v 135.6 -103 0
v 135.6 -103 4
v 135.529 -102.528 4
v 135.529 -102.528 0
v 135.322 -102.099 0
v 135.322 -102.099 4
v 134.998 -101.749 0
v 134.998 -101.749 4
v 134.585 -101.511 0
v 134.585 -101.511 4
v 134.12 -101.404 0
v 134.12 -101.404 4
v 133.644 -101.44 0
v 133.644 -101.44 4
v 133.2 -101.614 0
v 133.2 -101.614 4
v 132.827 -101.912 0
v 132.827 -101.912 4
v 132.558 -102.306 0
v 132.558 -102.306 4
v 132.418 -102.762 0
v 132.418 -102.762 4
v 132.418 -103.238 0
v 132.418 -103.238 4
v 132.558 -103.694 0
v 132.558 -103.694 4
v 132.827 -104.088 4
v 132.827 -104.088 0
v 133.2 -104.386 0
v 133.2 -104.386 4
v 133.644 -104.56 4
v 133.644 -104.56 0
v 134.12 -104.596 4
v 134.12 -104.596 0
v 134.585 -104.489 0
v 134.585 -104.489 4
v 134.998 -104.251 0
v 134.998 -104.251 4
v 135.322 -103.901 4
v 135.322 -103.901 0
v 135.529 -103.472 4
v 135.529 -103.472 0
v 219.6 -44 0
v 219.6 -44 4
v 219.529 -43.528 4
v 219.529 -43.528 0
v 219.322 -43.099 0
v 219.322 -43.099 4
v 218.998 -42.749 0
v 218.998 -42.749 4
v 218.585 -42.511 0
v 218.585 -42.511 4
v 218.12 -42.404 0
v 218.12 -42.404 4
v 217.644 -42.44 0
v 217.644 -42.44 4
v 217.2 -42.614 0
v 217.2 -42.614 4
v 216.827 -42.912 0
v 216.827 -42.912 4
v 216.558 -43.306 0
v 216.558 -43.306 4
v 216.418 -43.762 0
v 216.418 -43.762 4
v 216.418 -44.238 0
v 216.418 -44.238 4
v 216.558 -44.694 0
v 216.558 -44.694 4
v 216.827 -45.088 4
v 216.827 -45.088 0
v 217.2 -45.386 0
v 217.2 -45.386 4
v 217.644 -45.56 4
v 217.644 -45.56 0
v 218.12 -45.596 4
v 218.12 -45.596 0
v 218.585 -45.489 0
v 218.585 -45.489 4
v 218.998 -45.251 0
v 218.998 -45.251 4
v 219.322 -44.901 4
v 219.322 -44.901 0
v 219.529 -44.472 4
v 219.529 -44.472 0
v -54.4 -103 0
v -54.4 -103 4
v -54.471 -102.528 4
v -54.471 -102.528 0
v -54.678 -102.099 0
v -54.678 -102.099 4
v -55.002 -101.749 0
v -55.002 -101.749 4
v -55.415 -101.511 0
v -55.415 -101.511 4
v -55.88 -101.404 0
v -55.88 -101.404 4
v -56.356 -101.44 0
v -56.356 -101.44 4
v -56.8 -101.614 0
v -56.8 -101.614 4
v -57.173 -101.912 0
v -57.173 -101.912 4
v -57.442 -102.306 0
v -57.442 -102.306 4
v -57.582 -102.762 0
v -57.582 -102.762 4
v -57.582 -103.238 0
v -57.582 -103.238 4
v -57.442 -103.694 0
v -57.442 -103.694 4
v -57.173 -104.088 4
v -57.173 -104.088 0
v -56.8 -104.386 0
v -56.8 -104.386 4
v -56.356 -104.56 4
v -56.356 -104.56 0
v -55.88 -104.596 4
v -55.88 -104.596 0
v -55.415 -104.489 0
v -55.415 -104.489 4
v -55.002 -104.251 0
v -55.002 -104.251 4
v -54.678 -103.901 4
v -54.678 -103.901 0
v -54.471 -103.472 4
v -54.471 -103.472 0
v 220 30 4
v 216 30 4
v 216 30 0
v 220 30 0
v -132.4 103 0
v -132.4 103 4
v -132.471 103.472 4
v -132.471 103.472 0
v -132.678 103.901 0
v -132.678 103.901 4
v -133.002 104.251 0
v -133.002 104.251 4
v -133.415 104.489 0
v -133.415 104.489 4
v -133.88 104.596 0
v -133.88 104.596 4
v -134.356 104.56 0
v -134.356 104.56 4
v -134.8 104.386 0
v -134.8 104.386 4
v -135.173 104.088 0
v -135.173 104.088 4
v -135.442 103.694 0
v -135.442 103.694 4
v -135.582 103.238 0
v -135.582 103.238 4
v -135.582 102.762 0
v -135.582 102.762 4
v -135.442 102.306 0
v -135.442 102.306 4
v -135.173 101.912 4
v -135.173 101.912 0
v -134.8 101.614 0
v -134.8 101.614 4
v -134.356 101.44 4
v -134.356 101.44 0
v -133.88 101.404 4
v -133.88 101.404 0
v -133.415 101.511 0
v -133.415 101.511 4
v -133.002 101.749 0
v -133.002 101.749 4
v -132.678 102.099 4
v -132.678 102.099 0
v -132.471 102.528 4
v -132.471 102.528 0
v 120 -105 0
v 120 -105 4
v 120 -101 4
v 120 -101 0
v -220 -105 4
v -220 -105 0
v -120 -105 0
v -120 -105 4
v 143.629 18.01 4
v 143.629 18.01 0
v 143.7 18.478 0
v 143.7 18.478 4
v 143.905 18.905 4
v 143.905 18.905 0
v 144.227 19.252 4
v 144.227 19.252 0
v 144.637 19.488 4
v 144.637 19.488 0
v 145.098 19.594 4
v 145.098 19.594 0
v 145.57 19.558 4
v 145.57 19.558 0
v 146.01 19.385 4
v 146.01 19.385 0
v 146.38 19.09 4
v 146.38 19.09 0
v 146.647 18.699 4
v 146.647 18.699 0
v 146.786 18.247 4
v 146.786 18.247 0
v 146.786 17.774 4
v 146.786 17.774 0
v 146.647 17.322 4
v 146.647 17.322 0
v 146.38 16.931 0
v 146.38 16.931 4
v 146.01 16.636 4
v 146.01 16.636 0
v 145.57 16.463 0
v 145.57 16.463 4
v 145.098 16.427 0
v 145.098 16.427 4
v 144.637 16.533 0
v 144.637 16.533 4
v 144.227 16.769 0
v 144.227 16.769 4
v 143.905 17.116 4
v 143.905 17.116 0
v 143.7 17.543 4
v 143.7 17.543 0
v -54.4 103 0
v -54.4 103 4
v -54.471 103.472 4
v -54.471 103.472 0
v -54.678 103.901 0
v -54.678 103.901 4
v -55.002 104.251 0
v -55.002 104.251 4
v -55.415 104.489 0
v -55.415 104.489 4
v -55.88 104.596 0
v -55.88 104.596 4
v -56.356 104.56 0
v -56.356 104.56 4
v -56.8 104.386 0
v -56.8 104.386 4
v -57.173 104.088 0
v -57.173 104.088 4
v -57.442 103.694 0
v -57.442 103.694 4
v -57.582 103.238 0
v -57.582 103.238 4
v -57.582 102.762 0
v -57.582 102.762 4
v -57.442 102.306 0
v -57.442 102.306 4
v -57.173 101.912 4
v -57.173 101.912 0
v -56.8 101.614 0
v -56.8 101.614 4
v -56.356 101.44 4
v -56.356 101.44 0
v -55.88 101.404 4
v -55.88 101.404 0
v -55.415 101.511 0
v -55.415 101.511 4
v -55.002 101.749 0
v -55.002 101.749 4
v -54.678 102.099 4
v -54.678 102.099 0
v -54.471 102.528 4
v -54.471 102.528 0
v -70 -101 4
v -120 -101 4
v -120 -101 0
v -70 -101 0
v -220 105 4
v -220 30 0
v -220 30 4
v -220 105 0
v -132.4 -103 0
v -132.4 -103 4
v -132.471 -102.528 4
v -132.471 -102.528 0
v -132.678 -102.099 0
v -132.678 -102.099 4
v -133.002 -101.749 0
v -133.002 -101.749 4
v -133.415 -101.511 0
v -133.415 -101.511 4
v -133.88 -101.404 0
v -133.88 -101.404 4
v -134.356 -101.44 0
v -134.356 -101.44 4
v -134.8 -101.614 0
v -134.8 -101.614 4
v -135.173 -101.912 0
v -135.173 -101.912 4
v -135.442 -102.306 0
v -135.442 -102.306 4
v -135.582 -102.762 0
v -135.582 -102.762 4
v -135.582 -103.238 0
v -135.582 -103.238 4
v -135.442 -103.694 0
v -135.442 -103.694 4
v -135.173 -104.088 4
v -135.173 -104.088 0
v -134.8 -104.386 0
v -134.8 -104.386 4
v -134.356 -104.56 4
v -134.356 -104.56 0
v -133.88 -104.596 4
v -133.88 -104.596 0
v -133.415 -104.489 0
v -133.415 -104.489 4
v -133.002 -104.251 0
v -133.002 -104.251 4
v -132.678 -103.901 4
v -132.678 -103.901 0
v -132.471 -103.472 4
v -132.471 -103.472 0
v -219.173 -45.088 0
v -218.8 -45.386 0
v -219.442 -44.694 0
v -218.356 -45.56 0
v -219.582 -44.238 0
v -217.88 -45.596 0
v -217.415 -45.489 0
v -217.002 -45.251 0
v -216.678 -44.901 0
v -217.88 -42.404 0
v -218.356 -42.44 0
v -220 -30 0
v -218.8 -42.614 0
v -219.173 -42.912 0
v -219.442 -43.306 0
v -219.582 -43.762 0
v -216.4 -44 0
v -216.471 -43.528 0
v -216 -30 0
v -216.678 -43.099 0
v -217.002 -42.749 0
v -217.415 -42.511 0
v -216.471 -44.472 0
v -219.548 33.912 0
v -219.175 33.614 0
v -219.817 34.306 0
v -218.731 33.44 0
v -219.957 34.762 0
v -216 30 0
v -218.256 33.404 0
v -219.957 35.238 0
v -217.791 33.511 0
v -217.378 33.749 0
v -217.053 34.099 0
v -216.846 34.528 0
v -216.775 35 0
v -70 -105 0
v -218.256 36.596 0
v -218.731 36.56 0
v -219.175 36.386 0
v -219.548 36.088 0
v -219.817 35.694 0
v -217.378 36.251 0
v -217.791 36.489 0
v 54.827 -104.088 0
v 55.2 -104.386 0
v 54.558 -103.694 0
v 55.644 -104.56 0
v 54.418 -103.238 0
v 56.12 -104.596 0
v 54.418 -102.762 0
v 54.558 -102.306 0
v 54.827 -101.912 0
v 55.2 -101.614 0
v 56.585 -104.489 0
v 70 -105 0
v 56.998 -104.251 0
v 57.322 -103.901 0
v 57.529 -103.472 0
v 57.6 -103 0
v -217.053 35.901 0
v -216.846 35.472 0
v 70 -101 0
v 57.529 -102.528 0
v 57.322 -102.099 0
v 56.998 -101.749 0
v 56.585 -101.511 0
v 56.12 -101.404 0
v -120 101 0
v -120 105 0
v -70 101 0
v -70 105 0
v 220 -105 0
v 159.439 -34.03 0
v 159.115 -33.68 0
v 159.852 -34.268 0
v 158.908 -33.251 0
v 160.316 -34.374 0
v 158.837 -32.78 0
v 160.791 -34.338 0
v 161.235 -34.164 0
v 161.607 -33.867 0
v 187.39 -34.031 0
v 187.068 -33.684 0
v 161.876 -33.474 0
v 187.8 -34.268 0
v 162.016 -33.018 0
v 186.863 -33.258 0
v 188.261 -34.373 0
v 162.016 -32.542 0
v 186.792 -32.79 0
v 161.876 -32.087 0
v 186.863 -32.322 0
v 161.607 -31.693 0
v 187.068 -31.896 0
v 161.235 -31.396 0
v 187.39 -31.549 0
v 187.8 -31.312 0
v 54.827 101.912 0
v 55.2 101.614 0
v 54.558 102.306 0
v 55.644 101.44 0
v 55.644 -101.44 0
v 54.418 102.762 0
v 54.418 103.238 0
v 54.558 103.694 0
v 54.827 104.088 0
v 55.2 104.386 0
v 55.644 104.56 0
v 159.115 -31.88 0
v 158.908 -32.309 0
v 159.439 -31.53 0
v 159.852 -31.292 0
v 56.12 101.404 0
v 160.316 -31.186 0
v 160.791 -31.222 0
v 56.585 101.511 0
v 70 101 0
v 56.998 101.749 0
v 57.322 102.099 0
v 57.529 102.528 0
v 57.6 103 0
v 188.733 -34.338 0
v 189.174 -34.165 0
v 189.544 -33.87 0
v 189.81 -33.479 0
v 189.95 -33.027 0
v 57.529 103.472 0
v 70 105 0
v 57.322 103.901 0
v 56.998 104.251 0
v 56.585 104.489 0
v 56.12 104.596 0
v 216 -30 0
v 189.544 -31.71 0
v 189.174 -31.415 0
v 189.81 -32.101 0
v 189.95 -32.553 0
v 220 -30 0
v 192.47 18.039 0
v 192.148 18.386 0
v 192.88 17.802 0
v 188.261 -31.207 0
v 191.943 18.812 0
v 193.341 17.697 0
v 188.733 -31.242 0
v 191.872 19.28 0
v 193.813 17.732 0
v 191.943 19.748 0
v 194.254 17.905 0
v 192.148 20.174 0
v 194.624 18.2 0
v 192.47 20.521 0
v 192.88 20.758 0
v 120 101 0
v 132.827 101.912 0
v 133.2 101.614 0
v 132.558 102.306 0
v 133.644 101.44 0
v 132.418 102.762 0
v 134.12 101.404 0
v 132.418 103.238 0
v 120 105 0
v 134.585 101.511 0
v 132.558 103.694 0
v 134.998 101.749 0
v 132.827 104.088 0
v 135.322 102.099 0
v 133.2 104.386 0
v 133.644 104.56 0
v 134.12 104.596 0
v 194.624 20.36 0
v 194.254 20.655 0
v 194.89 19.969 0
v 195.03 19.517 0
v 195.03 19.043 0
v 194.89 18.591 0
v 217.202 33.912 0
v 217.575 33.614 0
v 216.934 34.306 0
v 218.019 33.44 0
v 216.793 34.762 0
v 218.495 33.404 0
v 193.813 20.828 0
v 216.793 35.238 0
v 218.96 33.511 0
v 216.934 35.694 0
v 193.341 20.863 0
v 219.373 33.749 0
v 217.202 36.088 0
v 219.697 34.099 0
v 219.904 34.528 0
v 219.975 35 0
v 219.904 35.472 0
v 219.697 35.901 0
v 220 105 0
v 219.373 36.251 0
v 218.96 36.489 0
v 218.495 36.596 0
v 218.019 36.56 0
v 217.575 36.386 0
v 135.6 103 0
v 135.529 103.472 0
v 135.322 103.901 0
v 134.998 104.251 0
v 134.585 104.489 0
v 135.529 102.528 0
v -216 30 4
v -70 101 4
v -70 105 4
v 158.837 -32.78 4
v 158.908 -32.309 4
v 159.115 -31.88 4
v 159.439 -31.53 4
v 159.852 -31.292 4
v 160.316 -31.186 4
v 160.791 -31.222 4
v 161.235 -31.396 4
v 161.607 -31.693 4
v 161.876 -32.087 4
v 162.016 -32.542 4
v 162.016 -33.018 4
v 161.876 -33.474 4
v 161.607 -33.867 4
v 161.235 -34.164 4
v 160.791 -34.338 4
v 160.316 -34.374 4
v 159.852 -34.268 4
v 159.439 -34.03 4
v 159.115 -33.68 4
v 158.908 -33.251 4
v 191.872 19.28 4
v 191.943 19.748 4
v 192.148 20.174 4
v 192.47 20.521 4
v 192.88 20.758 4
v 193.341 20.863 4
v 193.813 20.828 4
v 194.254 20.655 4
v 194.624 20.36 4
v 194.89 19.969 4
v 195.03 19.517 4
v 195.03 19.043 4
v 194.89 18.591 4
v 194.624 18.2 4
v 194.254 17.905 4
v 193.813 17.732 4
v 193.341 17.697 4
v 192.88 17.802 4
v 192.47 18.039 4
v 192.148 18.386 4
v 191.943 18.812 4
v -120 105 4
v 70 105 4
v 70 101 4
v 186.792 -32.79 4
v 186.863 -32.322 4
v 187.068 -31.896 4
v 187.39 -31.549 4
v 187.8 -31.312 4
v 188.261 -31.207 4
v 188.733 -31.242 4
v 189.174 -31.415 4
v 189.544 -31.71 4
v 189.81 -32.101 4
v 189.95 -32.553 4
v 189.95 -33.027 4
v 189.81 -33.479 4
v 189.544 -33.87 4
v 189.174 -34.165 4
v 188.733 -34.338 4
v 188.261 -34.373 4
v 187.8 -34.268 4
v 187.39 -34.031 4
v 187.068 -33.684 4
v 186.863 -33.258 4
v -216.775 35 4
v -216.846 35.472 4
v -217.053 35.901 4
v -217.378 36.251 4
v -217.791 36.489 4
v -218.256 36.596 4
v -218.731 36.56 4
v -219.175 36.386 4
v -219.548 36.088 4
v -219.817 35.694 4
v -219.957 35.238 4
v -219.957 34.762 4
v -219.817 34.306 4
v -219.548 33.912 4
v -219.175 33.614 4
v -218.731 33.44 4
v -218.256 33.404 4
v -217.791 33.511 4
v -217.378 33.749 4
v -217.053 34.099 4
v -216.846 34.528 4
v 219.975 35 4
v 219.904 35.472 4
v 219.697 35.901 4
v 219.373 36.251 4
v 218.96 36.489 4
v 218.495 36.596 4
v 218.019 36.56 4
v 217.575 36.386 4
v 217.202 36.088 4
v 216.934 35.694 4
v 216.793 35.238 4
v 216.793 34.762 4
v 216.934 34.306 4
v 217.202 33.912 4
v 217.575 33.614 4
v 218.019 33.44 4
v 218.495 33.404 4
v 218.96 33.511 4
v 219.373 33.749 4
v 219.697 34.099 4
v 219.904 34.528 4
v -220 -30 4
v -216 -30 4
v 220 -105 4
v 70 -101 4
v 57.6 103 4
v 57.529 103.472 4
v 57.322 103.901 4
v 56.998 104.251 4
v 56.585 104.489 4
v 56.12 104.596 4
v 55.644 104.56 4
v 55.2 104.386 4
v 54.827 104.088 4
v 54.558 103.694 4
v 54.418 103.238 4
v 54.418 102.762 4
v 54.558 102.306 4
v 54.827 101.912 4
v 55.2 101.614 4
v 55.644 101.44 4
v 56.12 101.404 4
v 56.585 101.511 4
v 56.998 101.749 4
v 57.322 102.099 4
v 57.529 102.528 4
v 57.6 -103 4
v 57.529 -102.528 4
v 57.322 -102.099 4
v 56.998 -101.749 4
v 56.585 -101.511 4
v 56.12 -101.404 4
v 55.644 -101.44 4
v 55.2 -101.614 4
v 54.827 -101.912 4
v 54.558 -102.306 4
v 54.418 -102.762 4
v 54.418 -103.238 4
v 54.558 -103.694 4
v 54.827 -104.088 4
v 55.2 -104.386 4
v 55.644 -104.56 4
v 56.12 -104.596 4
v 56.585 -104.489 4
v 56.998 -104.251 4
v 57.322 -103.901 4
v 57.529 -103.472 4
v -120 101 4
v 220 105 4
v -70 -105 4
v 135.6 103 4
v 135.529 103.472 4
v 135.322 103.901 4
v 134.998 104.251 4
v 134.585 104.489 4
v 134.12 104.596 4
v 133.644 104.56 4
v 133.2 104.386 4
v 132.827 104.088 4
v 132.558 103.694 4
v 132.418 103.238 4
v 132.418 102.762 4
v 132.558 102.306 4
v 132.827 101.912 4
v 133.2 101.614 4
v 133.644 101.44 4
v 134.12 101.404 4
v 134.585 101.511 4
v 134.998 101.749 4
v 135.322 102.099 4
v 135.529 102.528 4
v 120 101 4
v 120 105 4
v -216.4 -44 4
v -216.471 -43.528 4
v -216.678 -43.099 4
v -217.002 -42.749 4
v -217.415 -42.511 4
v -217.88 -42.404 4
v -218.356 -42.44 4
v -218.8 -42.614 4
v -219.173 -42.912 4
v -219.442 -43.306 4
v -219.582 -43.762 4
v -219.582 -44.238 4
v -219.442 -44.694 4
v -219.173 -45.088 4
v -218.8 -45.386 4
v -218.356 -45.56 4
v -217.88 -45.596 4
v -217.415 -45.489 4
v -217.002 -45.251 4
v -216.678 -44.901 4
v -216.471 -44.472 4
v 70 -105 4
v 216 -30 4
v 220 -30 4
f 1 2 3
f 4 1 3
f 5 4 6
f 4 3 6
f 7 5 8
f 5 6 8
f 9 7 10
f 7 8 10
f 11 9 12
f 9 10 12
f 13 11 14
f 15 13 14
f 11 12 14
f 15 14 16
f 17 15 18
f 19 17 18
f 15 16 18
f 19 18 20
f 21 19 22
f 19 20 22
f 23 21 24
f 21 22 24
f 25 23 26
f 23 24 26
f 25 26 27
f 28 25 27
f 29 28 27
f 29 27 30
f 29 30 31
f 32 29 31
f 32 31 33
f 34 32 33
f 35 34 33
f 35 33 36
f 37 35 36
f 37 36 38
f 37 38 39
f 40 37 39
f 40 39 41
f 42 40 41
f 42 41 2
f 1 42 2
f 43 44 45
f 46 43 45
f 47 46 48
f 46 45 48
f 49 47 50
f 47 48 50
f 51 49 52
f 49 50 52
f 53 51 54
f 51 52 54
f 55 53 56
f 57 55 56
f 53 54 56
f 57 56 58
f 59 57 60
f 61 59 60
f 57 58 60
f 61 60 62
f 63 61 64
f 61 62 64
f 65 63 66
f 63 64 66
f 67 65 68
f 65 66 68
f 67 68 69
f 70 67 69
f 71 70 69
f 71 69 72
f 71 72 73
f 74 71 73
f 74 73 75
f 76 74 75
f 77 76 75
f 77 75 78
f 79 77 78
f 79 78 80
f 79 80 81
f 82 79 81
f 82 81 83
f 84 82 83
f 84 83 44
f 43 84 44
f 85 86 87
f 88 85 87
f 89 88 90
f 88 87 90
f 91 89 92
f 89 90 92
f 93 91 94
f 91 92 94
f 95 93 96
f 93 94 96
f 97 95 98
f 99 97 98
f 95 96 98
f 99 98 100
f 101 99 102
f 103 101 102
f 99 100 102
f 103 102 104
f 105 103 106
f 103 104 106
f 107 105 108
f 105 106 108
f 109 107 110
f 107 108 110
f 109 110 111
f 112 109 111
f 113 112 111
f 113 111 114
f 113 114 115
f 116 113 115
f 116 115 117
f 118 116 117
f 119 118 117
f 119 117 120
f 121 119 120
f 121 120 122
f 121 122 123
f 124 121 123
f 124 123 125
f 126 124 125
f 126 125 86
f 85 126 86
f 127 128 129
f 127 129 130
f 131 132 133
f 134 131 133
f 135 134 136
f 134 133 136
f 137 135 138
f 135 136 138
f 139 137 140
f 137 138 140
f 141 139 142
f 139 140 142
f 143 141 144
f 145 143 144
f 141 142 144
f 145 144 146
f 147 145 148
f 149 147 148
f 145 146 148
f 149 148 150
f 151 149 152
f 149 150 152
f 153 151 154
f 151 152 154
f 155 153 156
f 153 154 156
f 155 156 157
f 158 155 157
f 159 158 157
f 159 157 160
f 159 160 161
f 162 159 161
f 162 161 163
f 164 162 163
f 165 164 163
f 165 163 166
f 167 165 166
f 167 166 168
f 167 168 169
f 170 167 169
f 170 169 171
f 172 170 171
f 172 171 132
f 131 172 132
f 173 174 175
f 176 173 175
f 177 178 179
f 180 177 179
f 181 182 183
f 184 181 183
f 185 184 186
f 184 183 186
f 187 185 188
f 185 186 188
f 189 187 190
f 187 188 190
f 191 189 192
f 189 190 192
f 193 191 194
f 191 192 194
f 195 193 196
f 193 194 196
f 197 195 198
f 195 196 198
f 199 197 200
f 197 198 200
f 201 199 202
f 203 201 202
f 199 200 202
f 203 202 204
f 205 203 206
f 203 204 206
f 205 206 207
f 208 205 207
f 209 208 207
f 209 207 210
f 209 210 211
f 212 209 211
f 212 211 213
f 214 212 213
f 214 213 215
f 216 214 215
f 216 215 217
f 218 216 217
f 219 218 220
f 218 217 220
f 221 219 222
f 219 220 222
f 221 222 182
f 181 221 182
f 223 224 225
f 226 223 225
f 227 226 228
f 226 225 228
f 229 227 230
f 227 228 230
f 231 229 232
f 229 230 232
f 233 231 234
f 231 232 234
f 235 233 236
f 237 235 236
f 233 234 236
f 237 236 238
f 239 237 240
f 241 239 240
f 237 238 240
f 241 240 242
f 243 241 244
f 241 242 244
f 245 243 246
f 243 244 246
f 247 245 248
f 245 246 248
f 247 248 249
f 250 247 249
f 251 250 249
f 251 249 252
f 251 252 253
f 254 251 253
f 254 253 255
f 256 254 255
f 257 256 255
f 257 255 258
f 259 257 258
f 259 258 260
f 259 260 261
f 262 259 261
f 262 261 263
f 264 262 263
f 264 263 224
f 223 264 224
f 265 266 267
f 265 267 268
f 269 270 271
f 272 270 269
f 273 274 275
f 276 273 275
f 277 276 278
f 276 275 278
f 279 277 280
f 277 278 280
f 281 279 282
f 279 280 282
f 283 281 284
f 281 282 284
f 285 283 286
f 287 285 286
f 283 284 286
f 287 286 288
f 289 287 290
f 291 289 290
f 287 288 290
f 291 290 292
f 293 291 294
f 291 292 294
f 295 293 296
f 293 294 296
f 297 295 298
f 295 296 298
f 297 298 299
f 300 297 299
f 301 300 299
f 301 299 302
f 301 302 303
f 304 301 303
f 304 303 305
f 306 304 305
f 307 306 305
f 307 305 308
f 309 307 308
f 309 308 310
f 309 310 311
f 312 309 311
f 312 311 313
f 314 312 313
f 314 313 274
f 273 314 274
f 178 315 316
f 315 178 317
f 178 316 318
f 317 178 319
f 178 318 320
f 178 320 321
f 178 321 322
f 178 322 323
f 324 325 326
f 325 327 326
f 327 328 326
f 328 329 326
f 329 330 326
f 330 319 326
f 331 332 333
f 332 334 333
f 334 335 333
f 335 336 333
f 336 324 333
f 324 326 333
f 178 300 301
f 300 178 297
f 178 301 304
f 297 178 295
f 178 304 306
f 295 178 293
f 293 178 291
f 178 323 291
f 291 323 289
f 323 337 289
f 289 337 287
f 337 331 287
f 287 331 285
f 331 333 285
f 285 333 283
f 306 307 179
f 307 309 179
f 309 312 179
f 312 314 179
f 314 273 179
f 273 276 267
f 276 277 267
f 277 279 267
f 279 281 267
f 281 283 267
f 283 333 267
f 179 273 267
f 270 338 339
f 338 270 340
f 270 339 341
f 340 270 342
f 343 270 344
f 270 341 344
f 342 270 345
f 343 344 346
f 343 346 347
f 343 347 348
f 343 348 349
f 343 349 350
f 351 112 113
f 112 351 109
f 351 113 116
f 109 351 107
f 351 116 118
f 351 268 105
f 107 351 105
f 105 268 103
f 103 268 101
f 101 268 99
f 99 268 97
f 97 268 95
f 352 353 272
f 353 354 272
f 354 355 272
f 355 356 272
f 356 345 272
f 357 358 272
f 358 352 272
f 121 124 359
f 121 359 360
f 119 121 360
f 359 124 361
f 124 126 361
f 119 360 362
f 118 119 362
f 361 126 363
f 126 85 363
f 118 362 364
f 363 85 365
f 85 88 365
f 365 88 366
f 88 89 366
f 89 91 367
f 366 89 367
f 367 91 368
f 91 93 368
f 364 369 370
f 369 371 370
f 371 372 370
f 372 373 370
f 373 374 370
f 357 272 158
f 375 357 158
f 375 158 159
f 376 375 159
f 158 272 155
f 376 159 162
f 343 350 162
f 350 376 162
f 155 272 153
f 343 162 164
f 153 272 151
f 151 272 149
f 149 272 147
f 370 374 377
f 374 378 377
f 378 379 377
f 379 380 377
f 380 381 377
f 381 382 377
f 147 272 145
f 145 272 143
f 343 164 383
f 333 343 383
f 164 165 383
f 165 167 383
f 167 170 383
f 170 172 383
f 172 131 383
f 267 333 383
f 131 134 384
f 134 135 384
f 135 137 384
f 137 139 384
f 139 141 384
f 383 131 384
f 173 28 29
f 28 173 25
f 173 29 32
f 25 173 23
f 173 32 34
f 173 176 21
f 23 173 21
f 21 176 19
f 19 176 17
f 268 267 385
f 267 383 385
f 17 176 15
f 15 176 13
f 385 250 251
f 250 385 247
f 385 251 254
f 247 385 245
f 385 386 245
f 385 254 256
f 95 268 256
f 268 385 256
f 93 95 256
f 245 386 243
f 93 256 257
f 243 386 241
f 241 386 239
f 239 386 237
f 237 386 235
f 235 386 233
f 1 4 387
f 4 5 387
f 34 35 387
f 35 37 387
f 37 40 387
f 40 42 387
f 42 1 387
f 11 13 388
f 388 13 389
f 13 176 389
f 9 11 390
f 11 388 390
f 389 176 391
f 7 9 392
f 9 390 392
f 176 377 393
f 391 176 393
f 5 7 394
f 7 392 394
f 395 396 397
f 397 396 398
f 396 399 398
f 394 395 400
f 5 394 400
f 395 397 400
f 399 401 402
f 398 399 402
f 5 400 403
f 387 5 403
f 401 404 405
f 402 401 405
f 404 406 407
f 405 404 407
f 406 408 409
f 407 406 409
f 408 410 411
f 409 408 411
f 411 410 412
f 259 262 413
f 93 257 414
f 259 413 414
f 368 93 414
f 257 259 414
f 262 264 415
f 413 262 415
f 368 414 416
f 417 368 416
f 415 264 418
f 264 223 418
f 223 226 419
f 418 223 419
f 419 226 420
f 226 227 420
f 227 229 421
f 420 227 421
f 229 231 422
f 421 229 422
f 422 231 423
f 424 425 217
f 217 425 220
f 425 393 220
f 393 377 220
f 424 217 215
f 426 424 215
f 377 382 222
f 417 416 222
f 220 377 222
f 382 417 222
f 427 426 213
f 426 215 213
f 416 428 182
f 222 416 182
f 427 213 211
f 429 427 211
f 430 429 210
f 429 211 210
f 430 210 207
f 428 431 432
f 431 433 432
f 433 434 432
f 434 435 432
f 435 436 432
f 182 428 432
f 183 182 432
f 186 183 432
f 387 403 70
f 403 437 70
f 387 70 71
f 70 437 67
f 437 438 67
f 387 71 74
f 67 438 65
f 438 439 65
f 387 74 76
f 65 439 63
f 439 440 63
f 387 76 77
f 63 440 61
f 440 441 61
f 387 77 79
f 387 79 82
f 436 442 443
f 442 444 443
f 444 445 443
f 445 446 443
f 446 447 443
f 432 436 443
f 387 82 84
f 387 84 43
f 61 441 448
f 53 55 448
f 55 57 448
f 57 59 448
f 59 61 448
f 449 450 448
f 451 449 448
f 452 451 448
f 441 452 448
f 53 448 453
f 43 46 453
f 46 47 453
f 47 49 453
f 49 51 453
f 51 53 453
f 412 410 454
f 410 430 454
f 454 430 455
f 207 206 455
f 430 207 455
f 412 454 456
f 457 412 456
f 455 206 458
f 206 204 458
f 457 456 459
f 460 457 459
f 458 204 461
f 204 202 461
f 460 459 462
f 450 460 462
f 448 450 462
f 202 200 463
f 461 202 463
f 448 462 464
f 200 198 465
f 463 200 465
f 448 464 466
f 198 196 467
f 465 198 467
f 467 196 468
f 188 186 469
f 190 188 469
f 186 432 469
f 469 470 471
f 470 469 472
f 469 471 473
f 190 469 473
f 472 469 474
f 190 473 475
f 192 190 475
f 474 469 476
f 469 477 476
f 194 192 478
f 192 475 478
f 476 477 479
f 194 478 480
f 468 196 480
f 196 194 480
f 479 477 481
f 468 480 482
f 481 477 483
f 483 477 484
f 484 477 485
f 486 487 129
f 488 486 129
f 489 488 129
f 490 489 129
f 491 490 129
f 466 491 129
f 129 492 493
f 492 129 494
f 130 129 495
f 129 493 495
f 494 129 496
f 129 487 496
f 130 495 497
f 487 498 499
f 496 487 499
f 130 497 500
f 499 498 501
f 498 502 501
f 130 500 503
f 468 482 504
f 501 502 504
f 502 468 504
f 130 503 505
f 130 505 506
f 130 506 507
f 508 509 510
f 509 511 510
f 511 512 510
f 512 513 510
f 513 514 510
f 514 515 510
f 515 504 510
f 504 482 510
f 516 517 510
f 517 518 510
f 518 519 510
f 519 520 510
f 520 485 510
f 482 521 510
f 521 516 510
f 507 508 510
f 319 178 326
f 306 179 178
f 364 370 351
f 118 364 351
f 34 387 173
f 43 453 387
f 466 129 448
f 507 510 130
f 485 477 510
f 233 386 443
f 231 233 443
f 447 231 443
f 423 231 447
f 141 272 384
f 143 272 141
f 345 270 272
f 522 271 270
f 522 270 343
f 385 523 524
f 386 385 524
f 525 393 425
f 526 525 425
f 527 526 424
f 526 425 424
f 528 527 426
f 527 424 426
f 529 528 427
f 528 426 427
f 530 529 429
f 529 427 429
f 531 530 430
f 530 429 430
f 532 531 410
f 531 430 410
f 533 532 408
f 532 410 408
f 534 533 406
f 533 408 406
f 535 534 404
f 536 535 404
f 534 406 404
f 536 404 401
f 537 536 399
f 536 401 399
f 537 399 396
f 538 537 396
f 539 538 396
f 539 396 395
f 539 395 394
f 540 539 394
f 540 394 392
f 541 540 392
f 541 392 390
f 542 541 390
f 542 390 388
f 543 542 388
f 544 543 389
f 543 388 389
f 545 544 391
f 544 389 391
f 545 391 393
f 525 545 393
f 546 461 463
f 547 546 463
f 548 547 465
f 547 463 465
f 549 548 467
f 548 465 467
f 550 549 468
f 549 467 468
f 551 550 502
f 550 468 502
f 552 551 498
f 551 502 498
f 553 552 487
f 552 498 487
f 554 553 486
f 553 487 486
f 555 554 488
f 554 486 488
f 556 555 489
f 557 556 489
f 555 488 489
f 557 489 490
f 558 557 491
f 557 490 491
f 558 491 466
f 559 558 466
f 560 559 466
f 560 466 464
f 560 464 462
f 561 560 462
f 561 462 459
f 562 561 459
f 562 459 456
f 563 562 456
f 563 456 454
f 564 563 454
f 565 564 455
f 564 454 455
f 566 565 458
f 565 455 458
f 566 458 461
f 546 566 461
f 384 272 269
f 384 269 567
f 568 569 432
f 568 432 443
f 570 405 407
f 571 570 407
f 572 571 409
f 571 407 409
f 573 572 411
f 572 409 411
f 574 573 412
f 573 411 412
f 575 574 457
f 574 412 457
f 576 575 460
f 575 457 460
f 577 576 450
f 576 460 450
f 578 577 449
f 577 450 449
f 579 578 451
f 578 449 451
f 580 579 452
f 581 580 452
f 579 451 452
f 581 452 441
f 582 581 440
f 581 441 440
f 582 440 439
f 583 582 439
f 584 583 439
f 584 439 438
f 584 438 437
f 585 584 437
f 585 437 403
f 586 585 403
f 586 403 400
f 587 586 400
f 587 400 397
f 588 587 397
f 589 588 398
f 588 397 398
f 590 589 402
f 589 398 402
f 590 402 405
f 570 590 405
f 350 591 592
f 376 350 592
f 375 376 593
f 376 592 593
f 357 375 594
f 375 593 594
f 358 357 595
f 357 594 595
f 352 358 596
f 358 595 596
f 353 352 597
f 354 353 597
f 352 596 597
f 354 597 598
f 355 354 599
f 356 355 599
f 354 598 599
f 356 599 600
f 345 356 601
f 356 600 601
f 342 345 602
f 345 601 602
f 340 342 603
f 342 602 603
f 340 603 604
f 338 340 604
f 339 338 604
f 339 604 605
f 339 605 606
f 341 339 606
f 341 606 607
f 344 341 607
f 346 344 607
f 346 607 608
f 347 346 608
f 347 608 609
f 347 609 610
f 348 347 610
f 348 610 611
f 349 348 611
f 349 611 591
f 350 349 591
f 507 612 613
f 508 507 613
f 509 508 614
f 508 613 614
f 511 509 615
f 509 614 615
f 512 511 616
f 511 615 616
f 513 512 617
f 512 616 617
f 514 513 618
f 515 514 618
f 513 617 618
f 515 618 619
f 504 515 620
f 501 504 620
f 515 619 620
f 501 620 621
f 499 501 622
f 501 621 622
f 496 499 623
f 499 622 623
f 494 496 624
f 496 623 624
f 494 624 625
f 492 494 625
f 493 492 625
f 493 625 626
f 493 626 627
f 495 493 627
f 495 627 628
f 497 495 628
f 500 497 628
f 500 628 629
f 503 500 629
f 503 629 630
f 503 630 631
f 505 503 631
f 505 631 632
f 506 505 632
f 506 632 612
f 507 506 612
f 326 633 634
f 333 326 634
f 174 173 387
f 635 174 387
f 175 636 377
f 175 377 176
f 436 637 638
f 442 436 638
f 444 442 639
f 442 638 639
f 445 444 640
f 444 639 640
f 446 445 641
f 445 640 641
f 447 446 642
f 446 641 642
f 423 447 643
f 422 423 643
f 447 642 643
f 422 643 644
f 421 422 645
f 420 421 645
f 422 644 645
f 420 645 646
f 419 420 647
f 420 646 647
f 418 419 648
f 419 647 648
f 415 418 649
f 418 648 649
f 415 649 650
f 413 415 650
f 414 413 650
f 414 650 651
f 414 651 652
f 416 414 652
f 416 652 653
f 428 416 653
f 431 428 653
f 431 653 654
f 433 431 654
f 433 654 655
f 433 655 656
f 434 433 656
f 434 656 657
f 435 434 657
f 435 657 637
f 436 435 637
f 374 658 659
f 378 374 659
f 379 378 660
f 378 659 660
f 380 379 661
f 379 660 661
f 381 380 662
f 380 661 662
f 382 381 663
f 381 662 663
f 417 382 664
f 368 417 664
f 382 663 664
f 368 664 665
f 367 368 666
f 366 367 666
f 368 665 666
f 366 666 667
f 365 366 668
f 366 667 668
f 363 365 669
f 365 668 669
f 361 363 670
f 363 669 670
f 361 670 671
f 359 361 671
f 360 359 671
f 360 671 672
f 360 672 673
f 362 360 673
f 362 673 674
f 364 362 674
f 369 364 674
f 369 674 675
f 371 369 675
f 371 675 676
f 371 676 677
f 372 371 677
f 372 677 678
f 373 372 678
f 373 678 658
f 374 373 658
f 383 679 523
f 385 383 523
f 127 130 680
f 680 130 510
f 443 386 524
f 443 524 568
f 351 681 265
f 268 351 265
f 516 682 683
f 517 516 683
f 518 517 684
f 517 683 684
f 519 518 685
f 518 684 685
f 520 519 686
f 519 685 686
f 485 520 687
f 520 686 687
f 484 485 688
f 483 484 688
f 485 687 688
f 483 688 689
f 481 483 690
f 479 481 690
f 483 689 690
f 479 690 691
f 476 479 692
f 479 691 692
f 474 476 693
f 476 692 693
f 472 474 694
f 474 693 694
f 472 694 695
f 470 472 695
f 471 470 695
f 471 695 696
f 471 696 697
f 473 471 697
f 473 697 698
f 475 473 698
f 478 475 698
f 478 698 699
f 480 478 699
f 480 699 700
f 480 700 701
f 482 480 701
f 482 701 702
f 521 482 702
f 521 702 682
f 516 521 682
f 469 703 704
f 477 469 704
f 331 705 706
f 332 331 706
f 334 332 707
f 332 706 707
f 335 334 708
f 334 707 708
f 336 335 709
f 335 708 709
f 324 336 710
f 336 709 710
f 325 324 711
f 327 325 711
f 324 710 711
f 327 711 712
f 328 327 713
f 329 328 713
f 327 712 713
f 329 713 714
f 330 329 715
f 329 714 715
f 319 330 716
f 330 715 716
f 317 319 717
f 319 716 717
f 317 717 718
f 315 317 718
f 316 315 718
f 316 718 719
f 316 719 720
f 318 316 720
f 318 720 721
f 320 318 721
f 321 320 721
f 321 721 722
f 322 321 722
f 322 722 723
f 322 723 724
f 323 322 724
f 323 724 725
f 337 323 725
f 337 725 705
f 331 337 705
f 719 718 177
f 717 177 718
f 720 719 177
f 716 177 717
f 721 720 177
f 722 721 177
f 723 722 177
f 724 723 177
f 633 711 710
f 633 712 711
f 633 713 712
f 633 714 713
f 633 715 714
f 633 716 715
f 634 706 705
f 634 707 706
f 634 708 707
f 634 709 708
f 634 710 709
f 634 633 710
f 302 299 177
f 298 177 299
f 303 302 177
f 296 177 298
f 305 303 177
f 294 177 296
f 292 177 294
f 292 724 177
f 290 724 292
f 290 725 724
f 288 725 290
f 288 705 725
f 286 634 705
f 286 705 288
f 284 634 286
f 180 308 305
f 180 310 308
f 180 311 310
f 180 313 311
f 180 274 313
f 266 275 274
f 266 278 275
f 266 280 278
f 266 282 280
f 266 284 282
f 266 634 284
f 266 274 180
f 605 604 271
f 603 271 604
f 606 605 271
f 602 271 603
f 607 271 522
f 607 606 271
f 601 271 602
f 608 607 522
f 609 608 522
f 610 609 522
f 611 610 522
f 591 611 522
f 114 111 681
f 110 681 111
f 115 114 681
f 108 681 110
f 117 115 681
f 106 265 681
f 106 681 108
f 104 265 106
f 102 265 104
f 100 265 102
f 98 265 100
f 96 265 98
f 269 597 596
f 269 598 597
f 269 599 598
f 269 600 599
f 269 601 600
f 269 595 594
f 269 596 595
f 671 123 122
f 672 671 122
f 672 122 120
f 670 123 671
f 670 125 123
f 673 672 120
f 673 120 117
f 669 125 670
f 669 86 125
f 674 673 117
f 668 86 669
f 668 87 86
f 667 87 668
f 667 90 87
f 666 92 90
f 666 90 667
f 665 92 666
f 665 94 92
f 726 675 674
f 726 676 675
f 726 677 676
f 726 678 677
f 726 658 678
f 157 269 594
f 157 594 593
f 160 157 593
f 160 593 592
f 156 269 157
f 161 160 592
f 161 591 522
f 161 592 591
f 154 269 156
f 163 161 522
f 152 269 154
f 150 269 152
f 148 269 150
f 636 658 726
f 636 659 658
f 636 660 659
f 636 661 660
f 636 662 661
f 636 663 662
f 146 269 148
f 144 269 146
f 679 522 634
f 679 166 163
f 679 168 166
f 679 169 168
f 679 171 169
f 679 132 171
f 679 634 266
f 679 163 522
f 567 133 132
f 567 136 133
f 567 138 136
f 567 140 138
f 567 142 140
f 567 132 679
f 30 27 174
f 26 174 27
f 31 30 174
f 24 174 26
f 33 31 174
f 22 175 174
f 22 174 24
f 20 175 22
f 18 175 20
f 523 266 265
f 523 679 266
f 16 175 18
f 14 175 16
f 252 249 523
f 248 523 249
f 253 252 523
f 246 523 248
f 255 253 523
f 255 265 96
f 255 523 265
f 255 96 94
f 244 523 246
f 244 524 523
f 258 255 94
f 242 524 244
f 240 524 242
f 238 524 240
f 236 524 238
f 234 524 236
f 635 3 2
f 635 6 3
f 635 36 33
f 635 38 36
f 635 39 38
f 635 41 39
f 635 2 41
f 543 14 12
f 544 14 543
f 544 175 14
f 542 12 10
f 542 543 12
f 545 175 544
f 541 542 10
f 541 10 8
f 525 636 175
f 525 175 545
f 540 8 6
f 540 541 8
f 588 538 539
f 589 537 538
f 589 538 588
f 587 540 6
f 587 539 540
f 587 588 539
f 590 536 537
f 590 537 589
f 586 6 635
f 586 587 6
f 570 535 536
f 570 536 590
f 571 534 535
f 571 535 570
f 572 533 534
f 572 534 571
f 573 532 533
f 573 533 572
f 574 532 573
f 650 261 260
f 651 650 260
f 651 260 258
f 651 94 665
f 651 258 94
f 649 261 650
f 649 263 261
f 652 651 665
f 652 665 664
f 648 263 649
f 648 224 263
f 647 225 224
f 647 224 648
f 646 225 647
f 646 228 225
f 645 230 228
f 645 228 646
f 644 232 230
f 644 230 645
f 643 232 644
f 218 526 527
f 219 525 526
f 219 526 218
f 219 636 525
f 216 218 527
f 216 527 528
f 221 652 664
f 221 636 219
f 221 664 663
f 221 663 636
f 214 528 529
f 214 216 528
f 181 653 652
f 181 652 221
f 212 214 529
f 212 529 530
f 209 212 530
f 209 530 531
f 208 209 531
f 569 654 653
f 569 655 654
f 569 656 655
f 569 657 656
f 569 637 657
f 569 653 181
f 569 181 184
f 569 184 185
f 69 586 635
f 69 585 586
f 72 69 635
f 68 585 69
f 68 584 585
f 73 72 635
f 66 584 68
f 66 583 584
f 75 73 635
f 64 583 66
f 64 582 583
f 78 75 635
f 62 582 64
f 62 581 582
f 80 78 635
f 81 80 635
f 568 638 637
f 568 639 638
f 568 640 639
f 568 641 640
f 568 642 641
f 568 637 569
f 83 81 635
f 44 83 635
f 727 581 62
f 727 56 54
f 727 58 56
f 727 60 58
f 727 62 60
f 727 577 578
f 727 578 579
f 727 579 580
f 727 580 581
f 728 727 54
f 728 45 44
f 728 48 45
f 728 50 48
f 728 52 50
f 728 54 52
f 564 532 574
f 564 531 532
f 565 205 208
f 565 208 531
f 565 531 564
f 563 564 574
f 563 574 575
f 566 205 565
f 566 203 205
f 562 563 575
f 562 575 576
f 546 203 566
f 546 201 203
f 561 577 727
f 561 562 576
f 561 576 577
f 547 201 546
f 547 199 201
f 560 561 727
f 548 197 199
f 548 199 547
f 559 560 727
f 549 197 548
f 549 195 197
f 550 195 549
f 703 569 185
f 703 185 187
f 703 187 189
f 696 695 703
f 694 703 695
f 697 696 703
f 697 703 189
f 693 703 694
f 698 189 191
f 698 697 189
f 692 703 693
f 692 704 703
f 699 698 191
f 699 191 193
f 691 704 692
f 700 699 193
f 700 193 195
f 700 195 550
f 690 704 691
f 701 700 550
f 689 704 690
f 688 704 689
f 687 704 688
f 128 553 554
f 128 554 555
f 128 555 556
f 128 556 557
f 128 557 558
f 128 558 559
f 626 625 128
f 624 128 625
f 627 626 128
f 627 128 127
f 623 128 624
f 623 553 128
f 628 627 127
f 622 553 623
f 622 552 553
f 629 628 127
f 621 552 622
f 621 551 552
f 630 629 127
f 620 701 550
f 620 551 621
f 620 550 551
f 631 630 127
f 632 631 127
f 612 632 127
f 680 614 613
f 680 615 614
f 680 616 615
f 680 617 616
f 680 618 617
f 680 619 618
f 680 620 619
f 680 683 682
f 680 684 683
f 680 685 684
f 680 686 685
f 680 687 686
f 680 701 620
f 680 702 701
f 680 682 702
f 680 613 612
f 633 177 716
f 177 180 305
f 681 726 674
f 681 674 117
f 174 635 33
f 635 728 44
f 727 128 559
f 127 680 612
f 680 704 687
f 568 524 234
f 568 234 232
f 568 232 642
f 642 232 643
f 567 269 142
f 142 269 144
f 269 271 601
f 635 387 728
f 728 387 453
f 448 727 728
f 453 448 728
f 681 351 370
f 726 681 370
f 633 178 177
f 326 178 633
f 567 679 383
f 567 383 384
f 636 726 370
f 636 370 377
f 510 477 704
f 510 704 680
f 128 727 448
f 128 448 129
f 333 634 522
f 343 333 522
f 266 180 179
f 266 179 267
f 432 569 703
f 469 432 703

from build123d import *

# Parameters (mm, degrees)
ESQUISSE1_W             = 440
ESQUISSE1_H             = 210
BOSS_EXTRU_1_DEPTH      = 4
ESQUISSE2_W             = 50
ESQUISSE2_H             = 4
ESQUISSE2_W_2           = 4
ESQUISSE2_H_2           = 60
ENL_V_MAT_EXTRU_1_DEPTH = 4
ESQUISSE4_R             = 1.6
ENL_V_MAT_EXTRU_2_DEPTH = 10
ESQUISSE5_R             = 1.5875
ESQUISSE5_R_2           = 1.598396888
ENL_V_MAT_EXTRU_3_DEPTH = 4


with BuildPart() as part:
    # Esquisse1 → Boss.-Extru.1 (new body)
    with BuildSketch(Plane.XY):
        Rectangle(ESQUISSE1_W, ESQUISSE1_H)
    extrude(amount=BOSS_EXTRU_1_DEPTH)

    # Esquisse2 → Enlèv. mat.-Extru.1 (cut)
    with BuildSketch(Plane.XY.offset(4)):
        with Locations((-95, 103)):
            Rectangle(ESQUISSE2_W, ESQUISSE2_H)
        with Locations((95, 103)):
            Rectangle(ESQUISSE2_W, ESQUISSE2_H)
        with Locations((218, 0)):
            Rectangle(ESQUISSE2_W_2, ESQUISSE2_H_2)
        with Locations((-218, 0)):
            Rectangle(ESQUISSE2_W_2, ESQUISSE2_H_2)
        with Locations((95, -103)):
            Rectangle(ESQUISSE2_W, ESQUISSE2_H)
        with Locations((-95, -103)):
            Rectangle(ESQUISSE2_W, ESQUISSE2_H)
    extrude(amount=-ENL_V_MAT_EXTRU_1_DEPTH, mode=Mode.SUBTRACT)

    # Esquisse4 → Enlèv. mat.-Extru.2 (cut)
    with BuildSketch(Plane.XY.offset(4)):
        with Locations((218, -44)):
            Circle(ESQUISSE4_R)
        with Locations((218.375135888, 35)):
            Circle(ESQUISSE4_R)
        with Locations((-56, 103)):
            Circle(ESQUISSE4_R)
        with Locations((-134, 103)):
            Circle(ESQUISSE4_R)
        with Locations((-218.375135888, 35)):
            Circle(ESQUISSE4_R)
        with Locations((-56, -103)):
            Circle(ESQUISSE4_R)
        with Locations((-134, -103)):
            Circle(ESQUISSE4_R)
        with Locations((134, 103)):
            Circle(ESQUISSE4_R)
        with Locations((56, 103)):
            Circle(ESQUISSE4_R)
        with Locations((-218, -44)):
            Circle(ESQUISSE4_R)
        with Locations((56, -103)):
            Circle(ESQUISSE4_R)
        with Locations((134, -103)):
            Circle(ESQUISSE4_R)
    extrude(amount=-ENL_V_MAT_EXTRU_2_DEPTH, mode=Mode.SUBTRACT)

    # Esquisse5 → Enlèv. mat.-Extru.3 (cut)
    with BuildSketch(Plane(origin=(0, 0, 0), x_dir=(-1, 0, 0), z_dir=(0, 0, -1))):
        with Locations((-145.216701852, 18.010439522)):
            Circle(ESQUISSE5_R)
        with Locations((-160.435580246, -32.780039682)):
            Circle(ESQUISSE5_R_2)
        with Locations((-188.38, -32.79)):
            Circle(ESQUISSE5_R)
        with Locations((-193.46, 19.28)):
            Circle(ESQUISSE5_R)
    extrude(amount=-ENL_V_MAT_EXTRU_3_DEPTH, mode=Mode.SUBTRACT)


solid = part.part
